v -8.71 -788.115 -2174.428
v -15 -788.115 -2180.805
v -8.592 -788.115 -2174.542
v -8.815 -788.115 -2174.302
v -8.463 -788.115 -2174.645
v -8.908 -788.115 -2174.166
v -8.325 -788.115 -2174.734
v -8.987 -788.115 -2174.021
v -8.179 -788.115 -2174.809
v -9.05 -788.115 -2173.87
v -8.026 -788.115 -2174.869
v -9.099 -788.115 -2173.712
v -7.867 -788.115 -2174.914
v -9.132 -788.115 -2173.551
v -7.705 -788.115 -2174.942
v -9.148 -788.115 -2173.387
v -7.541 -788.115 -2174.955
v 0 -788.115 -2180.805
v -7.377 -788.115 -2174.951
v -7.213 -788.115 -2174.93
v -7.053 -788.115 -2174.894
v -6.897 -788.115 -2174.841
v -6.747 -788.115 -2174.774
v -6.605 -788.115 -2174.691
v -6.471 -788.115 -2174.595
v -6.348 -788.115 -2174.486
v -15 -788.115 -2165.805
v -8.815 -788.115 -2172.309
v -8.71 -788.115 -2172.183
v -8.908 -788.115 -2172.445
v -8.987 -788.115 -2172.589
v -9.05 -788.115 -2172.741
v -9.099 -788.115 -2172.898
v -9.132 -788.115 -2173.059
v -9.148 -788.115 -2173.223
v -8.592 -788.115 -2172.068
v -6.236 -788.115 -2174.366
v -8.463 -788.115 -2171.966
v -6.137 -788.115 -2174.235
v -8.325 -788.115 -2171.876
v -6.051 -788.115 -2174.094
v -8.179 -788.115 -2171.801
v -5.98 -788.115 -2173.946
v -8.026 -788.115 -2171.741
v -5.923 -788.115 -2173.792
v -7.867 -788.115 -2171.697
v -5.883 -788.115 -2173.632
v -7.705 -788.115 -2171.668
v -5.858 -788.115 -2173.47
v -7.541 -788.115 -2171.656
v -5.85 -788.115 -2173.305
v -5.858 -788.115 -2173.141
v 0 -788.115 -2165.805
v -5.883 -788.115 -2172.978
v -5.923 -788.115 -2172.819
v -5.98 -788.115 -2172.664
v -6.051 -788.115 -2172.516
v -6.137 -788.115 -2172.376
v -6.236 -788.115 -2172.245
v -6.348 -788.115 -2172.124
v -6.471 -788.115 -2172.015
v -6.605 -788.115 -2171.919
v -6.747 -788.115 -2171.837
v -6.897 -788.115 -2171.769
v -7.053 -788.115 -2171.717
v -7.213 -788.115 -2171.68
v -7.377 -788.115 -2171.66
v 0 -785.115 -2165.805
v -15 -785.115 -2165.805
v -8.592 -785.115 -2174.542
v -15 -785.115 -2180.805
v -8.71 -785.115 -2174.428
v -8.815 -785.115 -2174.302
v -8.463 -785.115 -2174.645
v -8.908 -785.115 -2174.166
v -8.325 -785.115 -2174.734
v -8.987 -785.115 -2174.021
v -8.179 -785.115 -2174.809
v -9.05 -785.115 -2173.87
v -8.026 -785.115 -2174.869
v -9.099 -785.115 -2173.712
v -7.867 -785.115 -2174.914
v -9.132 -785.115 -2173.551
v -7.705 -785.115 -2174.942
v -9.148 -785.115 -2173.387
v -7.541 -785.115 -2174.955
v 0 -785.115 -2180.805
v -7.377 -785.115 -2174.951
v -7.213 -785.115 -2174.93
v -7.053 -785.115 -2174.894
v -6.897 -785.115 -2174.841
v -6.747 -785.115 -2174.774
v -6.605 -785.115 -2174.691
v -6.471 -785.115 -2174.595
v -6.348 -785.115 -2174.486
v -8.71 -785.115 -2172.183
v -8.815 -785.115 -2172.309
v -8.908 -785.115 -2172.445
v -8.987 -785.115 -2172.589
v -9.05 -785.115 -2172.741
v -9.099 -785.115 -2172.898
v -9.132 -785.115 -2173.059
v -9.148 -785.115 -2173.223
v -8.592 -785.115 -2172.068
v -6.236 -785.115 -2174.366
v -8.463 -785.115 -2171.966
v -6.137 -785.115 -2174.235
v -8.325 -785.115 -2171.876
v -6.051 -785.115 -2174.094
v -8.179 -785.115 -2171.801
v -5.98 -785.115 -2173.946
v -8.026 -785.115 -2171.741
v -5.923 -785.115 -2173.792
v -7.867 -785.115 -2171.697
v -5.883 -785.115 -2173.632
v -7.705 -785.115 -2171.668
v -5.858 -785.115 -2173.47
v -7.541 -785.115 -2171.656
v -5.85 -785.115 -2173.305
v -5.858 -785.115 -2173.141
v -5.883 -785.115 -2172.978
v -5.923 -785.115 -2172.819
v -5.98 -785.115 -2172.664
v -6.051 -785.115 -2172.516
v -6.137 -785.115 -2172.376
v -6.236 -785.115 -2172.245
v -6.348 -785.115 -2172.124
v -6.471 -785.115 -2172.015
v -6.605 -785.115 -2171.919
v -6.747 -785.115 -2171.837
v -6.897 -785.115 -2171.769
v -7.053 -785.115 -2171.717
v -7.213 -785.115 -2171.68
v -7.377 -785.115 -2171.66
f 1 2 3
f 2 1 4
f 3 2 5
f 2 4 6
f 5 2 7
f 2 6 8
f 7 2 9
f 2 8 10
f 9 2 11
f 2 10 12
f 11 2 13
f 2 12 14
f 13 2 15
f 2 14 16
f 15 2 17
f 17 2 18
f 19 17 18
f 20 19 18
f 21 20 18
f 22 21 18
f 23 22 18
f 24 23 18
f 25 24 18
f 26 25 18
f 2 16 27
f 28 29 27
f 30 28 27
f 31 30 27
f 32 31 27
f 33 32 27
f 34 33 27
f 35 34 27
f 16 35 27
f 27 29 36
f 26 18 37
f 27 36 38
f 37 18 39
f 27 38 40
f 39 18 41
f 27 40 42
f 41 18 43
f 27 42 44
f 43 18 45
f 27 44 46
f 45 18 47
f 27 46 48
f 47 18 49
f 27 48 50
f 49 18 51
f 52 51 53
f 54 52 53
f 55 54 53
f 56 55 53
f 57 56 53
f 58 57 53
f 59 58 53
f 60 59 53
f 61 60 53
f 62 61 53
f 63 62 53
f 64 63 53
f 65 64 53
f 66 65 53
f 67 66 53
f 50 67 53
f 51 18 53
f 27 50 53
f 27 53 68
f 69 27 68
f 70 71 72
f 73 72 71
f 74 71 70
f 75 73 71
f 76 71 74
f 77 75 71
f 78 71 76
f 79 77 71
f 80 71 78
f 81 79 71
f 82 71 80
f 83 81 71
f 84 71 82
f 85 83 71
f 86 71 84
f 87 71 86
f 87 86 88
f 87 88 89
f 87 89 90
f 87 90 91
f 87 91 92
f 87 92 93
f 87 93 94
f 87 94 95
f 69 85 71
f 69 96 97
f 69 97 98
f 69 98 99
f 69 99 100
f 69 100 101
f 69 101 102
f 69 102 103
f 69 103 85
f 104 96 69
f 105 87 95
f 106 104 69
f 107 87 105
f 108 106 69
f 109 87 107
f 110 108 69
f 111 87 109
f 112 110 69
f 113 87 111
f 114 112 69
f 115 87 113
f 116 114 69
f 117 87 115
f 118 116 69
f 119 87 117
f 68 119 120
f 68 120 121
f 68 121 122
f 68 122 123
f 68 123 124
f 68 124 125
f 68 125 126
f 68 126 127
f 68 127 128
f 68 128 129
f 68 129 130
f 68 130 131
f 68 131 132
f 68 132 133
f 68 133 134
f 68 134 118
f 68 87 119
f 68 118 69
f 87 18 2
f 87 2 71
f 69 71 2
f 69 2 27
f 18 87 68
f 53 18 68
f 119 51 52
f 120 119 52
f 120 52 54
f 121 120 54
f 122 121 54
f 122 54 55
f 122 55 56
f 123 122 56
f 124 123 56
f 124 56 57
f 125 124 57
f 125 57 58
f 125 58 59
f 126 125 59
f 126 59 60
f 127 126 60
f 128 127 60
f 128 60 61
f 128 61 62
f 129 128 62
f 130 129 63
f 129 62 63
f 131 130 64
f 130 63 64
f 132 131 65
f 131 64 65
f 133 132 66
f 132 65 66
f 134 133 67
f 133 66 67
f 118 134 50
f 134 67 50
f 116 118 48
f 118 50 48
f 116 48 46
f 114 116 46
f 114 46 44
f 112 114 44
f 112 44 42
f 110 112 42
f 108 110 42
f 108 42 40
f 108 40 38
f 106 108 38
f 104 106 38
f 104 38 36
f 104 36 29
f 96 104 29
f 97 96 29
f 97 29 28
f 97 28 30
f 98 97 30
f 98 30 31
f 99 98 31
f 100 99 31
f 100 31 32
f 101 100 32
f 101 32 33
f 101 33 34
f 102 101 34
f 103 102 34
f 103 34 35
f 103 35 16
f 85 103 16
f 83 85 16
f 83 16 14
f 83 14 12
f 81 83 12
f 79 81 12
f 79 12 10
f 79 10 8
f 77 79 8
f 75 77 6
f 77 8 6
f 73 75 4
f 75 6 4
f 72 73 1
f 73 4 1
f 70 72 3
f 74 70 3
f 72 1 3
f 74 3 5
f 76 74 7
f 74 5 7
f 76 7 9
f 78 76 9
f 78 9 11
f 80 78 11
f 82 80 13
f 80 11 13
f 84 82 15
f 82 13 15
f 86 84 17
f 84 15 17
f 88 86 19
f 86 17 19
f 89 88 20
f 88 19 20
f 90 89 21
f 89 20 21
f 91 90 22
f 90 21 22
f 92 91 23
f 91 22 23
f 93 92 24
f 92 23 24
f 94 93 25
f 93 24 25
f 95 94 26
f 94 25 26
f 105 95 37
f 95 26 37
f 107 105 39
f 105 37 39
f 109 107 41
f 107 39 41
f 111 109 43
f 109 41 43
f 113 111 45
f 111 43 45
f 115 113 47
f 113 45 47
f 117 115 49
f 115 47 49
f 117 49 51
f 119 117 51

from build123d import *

# Parameters (mm, degrees)
SKETCH_1_W             = 15
SKETCH_1_H             = 3
EXTRUDE_1_DEPTH        = 15
HOLE_WIZARD_M4_1_D     = 3.3
HOLE_WIZARD_M4_1_DEPTH = 11.5
HOLE_WIZARD_M4_1_TIP   = 0.991420021


with BuildPart() as part:
    # 草图1 → 凸台-拉伸1 (new body)
    with BuildSketch(Plane.ZY):
        with Locations((-2173.305231444, -786.615322881)):
            Rectangle(SKETCH_1_W, SKETCH_1_H)
    extrude(amount=EXTRUDE_1_DEPTH)

    # M4 螺纹孔1
    with Locations(Plane(origin=(0, -785.115322881, 0), x_dir=(-1, 0, 0), z_dir=(0, 1, 0))):
        with Locations((7.5, -2173.305231444)):
            Hole(HOLE_WIZARD_M4_1_D / 2, depth=HOLE_WIZARD_M4_1_DEPTH)
            with Locations((0, 0, -(HOLE_WIZARD_M4_1_DEPTH + HOLE_WIZARD_M4_1_TIP / 2))):  # 118° drill point
                Cone(0, HOLE_WIZARD_M4_1_D / 2, HOLE_WIZARD_M4_1_TIP, mode=Mode.SUBTRACT)


solid = part.part
